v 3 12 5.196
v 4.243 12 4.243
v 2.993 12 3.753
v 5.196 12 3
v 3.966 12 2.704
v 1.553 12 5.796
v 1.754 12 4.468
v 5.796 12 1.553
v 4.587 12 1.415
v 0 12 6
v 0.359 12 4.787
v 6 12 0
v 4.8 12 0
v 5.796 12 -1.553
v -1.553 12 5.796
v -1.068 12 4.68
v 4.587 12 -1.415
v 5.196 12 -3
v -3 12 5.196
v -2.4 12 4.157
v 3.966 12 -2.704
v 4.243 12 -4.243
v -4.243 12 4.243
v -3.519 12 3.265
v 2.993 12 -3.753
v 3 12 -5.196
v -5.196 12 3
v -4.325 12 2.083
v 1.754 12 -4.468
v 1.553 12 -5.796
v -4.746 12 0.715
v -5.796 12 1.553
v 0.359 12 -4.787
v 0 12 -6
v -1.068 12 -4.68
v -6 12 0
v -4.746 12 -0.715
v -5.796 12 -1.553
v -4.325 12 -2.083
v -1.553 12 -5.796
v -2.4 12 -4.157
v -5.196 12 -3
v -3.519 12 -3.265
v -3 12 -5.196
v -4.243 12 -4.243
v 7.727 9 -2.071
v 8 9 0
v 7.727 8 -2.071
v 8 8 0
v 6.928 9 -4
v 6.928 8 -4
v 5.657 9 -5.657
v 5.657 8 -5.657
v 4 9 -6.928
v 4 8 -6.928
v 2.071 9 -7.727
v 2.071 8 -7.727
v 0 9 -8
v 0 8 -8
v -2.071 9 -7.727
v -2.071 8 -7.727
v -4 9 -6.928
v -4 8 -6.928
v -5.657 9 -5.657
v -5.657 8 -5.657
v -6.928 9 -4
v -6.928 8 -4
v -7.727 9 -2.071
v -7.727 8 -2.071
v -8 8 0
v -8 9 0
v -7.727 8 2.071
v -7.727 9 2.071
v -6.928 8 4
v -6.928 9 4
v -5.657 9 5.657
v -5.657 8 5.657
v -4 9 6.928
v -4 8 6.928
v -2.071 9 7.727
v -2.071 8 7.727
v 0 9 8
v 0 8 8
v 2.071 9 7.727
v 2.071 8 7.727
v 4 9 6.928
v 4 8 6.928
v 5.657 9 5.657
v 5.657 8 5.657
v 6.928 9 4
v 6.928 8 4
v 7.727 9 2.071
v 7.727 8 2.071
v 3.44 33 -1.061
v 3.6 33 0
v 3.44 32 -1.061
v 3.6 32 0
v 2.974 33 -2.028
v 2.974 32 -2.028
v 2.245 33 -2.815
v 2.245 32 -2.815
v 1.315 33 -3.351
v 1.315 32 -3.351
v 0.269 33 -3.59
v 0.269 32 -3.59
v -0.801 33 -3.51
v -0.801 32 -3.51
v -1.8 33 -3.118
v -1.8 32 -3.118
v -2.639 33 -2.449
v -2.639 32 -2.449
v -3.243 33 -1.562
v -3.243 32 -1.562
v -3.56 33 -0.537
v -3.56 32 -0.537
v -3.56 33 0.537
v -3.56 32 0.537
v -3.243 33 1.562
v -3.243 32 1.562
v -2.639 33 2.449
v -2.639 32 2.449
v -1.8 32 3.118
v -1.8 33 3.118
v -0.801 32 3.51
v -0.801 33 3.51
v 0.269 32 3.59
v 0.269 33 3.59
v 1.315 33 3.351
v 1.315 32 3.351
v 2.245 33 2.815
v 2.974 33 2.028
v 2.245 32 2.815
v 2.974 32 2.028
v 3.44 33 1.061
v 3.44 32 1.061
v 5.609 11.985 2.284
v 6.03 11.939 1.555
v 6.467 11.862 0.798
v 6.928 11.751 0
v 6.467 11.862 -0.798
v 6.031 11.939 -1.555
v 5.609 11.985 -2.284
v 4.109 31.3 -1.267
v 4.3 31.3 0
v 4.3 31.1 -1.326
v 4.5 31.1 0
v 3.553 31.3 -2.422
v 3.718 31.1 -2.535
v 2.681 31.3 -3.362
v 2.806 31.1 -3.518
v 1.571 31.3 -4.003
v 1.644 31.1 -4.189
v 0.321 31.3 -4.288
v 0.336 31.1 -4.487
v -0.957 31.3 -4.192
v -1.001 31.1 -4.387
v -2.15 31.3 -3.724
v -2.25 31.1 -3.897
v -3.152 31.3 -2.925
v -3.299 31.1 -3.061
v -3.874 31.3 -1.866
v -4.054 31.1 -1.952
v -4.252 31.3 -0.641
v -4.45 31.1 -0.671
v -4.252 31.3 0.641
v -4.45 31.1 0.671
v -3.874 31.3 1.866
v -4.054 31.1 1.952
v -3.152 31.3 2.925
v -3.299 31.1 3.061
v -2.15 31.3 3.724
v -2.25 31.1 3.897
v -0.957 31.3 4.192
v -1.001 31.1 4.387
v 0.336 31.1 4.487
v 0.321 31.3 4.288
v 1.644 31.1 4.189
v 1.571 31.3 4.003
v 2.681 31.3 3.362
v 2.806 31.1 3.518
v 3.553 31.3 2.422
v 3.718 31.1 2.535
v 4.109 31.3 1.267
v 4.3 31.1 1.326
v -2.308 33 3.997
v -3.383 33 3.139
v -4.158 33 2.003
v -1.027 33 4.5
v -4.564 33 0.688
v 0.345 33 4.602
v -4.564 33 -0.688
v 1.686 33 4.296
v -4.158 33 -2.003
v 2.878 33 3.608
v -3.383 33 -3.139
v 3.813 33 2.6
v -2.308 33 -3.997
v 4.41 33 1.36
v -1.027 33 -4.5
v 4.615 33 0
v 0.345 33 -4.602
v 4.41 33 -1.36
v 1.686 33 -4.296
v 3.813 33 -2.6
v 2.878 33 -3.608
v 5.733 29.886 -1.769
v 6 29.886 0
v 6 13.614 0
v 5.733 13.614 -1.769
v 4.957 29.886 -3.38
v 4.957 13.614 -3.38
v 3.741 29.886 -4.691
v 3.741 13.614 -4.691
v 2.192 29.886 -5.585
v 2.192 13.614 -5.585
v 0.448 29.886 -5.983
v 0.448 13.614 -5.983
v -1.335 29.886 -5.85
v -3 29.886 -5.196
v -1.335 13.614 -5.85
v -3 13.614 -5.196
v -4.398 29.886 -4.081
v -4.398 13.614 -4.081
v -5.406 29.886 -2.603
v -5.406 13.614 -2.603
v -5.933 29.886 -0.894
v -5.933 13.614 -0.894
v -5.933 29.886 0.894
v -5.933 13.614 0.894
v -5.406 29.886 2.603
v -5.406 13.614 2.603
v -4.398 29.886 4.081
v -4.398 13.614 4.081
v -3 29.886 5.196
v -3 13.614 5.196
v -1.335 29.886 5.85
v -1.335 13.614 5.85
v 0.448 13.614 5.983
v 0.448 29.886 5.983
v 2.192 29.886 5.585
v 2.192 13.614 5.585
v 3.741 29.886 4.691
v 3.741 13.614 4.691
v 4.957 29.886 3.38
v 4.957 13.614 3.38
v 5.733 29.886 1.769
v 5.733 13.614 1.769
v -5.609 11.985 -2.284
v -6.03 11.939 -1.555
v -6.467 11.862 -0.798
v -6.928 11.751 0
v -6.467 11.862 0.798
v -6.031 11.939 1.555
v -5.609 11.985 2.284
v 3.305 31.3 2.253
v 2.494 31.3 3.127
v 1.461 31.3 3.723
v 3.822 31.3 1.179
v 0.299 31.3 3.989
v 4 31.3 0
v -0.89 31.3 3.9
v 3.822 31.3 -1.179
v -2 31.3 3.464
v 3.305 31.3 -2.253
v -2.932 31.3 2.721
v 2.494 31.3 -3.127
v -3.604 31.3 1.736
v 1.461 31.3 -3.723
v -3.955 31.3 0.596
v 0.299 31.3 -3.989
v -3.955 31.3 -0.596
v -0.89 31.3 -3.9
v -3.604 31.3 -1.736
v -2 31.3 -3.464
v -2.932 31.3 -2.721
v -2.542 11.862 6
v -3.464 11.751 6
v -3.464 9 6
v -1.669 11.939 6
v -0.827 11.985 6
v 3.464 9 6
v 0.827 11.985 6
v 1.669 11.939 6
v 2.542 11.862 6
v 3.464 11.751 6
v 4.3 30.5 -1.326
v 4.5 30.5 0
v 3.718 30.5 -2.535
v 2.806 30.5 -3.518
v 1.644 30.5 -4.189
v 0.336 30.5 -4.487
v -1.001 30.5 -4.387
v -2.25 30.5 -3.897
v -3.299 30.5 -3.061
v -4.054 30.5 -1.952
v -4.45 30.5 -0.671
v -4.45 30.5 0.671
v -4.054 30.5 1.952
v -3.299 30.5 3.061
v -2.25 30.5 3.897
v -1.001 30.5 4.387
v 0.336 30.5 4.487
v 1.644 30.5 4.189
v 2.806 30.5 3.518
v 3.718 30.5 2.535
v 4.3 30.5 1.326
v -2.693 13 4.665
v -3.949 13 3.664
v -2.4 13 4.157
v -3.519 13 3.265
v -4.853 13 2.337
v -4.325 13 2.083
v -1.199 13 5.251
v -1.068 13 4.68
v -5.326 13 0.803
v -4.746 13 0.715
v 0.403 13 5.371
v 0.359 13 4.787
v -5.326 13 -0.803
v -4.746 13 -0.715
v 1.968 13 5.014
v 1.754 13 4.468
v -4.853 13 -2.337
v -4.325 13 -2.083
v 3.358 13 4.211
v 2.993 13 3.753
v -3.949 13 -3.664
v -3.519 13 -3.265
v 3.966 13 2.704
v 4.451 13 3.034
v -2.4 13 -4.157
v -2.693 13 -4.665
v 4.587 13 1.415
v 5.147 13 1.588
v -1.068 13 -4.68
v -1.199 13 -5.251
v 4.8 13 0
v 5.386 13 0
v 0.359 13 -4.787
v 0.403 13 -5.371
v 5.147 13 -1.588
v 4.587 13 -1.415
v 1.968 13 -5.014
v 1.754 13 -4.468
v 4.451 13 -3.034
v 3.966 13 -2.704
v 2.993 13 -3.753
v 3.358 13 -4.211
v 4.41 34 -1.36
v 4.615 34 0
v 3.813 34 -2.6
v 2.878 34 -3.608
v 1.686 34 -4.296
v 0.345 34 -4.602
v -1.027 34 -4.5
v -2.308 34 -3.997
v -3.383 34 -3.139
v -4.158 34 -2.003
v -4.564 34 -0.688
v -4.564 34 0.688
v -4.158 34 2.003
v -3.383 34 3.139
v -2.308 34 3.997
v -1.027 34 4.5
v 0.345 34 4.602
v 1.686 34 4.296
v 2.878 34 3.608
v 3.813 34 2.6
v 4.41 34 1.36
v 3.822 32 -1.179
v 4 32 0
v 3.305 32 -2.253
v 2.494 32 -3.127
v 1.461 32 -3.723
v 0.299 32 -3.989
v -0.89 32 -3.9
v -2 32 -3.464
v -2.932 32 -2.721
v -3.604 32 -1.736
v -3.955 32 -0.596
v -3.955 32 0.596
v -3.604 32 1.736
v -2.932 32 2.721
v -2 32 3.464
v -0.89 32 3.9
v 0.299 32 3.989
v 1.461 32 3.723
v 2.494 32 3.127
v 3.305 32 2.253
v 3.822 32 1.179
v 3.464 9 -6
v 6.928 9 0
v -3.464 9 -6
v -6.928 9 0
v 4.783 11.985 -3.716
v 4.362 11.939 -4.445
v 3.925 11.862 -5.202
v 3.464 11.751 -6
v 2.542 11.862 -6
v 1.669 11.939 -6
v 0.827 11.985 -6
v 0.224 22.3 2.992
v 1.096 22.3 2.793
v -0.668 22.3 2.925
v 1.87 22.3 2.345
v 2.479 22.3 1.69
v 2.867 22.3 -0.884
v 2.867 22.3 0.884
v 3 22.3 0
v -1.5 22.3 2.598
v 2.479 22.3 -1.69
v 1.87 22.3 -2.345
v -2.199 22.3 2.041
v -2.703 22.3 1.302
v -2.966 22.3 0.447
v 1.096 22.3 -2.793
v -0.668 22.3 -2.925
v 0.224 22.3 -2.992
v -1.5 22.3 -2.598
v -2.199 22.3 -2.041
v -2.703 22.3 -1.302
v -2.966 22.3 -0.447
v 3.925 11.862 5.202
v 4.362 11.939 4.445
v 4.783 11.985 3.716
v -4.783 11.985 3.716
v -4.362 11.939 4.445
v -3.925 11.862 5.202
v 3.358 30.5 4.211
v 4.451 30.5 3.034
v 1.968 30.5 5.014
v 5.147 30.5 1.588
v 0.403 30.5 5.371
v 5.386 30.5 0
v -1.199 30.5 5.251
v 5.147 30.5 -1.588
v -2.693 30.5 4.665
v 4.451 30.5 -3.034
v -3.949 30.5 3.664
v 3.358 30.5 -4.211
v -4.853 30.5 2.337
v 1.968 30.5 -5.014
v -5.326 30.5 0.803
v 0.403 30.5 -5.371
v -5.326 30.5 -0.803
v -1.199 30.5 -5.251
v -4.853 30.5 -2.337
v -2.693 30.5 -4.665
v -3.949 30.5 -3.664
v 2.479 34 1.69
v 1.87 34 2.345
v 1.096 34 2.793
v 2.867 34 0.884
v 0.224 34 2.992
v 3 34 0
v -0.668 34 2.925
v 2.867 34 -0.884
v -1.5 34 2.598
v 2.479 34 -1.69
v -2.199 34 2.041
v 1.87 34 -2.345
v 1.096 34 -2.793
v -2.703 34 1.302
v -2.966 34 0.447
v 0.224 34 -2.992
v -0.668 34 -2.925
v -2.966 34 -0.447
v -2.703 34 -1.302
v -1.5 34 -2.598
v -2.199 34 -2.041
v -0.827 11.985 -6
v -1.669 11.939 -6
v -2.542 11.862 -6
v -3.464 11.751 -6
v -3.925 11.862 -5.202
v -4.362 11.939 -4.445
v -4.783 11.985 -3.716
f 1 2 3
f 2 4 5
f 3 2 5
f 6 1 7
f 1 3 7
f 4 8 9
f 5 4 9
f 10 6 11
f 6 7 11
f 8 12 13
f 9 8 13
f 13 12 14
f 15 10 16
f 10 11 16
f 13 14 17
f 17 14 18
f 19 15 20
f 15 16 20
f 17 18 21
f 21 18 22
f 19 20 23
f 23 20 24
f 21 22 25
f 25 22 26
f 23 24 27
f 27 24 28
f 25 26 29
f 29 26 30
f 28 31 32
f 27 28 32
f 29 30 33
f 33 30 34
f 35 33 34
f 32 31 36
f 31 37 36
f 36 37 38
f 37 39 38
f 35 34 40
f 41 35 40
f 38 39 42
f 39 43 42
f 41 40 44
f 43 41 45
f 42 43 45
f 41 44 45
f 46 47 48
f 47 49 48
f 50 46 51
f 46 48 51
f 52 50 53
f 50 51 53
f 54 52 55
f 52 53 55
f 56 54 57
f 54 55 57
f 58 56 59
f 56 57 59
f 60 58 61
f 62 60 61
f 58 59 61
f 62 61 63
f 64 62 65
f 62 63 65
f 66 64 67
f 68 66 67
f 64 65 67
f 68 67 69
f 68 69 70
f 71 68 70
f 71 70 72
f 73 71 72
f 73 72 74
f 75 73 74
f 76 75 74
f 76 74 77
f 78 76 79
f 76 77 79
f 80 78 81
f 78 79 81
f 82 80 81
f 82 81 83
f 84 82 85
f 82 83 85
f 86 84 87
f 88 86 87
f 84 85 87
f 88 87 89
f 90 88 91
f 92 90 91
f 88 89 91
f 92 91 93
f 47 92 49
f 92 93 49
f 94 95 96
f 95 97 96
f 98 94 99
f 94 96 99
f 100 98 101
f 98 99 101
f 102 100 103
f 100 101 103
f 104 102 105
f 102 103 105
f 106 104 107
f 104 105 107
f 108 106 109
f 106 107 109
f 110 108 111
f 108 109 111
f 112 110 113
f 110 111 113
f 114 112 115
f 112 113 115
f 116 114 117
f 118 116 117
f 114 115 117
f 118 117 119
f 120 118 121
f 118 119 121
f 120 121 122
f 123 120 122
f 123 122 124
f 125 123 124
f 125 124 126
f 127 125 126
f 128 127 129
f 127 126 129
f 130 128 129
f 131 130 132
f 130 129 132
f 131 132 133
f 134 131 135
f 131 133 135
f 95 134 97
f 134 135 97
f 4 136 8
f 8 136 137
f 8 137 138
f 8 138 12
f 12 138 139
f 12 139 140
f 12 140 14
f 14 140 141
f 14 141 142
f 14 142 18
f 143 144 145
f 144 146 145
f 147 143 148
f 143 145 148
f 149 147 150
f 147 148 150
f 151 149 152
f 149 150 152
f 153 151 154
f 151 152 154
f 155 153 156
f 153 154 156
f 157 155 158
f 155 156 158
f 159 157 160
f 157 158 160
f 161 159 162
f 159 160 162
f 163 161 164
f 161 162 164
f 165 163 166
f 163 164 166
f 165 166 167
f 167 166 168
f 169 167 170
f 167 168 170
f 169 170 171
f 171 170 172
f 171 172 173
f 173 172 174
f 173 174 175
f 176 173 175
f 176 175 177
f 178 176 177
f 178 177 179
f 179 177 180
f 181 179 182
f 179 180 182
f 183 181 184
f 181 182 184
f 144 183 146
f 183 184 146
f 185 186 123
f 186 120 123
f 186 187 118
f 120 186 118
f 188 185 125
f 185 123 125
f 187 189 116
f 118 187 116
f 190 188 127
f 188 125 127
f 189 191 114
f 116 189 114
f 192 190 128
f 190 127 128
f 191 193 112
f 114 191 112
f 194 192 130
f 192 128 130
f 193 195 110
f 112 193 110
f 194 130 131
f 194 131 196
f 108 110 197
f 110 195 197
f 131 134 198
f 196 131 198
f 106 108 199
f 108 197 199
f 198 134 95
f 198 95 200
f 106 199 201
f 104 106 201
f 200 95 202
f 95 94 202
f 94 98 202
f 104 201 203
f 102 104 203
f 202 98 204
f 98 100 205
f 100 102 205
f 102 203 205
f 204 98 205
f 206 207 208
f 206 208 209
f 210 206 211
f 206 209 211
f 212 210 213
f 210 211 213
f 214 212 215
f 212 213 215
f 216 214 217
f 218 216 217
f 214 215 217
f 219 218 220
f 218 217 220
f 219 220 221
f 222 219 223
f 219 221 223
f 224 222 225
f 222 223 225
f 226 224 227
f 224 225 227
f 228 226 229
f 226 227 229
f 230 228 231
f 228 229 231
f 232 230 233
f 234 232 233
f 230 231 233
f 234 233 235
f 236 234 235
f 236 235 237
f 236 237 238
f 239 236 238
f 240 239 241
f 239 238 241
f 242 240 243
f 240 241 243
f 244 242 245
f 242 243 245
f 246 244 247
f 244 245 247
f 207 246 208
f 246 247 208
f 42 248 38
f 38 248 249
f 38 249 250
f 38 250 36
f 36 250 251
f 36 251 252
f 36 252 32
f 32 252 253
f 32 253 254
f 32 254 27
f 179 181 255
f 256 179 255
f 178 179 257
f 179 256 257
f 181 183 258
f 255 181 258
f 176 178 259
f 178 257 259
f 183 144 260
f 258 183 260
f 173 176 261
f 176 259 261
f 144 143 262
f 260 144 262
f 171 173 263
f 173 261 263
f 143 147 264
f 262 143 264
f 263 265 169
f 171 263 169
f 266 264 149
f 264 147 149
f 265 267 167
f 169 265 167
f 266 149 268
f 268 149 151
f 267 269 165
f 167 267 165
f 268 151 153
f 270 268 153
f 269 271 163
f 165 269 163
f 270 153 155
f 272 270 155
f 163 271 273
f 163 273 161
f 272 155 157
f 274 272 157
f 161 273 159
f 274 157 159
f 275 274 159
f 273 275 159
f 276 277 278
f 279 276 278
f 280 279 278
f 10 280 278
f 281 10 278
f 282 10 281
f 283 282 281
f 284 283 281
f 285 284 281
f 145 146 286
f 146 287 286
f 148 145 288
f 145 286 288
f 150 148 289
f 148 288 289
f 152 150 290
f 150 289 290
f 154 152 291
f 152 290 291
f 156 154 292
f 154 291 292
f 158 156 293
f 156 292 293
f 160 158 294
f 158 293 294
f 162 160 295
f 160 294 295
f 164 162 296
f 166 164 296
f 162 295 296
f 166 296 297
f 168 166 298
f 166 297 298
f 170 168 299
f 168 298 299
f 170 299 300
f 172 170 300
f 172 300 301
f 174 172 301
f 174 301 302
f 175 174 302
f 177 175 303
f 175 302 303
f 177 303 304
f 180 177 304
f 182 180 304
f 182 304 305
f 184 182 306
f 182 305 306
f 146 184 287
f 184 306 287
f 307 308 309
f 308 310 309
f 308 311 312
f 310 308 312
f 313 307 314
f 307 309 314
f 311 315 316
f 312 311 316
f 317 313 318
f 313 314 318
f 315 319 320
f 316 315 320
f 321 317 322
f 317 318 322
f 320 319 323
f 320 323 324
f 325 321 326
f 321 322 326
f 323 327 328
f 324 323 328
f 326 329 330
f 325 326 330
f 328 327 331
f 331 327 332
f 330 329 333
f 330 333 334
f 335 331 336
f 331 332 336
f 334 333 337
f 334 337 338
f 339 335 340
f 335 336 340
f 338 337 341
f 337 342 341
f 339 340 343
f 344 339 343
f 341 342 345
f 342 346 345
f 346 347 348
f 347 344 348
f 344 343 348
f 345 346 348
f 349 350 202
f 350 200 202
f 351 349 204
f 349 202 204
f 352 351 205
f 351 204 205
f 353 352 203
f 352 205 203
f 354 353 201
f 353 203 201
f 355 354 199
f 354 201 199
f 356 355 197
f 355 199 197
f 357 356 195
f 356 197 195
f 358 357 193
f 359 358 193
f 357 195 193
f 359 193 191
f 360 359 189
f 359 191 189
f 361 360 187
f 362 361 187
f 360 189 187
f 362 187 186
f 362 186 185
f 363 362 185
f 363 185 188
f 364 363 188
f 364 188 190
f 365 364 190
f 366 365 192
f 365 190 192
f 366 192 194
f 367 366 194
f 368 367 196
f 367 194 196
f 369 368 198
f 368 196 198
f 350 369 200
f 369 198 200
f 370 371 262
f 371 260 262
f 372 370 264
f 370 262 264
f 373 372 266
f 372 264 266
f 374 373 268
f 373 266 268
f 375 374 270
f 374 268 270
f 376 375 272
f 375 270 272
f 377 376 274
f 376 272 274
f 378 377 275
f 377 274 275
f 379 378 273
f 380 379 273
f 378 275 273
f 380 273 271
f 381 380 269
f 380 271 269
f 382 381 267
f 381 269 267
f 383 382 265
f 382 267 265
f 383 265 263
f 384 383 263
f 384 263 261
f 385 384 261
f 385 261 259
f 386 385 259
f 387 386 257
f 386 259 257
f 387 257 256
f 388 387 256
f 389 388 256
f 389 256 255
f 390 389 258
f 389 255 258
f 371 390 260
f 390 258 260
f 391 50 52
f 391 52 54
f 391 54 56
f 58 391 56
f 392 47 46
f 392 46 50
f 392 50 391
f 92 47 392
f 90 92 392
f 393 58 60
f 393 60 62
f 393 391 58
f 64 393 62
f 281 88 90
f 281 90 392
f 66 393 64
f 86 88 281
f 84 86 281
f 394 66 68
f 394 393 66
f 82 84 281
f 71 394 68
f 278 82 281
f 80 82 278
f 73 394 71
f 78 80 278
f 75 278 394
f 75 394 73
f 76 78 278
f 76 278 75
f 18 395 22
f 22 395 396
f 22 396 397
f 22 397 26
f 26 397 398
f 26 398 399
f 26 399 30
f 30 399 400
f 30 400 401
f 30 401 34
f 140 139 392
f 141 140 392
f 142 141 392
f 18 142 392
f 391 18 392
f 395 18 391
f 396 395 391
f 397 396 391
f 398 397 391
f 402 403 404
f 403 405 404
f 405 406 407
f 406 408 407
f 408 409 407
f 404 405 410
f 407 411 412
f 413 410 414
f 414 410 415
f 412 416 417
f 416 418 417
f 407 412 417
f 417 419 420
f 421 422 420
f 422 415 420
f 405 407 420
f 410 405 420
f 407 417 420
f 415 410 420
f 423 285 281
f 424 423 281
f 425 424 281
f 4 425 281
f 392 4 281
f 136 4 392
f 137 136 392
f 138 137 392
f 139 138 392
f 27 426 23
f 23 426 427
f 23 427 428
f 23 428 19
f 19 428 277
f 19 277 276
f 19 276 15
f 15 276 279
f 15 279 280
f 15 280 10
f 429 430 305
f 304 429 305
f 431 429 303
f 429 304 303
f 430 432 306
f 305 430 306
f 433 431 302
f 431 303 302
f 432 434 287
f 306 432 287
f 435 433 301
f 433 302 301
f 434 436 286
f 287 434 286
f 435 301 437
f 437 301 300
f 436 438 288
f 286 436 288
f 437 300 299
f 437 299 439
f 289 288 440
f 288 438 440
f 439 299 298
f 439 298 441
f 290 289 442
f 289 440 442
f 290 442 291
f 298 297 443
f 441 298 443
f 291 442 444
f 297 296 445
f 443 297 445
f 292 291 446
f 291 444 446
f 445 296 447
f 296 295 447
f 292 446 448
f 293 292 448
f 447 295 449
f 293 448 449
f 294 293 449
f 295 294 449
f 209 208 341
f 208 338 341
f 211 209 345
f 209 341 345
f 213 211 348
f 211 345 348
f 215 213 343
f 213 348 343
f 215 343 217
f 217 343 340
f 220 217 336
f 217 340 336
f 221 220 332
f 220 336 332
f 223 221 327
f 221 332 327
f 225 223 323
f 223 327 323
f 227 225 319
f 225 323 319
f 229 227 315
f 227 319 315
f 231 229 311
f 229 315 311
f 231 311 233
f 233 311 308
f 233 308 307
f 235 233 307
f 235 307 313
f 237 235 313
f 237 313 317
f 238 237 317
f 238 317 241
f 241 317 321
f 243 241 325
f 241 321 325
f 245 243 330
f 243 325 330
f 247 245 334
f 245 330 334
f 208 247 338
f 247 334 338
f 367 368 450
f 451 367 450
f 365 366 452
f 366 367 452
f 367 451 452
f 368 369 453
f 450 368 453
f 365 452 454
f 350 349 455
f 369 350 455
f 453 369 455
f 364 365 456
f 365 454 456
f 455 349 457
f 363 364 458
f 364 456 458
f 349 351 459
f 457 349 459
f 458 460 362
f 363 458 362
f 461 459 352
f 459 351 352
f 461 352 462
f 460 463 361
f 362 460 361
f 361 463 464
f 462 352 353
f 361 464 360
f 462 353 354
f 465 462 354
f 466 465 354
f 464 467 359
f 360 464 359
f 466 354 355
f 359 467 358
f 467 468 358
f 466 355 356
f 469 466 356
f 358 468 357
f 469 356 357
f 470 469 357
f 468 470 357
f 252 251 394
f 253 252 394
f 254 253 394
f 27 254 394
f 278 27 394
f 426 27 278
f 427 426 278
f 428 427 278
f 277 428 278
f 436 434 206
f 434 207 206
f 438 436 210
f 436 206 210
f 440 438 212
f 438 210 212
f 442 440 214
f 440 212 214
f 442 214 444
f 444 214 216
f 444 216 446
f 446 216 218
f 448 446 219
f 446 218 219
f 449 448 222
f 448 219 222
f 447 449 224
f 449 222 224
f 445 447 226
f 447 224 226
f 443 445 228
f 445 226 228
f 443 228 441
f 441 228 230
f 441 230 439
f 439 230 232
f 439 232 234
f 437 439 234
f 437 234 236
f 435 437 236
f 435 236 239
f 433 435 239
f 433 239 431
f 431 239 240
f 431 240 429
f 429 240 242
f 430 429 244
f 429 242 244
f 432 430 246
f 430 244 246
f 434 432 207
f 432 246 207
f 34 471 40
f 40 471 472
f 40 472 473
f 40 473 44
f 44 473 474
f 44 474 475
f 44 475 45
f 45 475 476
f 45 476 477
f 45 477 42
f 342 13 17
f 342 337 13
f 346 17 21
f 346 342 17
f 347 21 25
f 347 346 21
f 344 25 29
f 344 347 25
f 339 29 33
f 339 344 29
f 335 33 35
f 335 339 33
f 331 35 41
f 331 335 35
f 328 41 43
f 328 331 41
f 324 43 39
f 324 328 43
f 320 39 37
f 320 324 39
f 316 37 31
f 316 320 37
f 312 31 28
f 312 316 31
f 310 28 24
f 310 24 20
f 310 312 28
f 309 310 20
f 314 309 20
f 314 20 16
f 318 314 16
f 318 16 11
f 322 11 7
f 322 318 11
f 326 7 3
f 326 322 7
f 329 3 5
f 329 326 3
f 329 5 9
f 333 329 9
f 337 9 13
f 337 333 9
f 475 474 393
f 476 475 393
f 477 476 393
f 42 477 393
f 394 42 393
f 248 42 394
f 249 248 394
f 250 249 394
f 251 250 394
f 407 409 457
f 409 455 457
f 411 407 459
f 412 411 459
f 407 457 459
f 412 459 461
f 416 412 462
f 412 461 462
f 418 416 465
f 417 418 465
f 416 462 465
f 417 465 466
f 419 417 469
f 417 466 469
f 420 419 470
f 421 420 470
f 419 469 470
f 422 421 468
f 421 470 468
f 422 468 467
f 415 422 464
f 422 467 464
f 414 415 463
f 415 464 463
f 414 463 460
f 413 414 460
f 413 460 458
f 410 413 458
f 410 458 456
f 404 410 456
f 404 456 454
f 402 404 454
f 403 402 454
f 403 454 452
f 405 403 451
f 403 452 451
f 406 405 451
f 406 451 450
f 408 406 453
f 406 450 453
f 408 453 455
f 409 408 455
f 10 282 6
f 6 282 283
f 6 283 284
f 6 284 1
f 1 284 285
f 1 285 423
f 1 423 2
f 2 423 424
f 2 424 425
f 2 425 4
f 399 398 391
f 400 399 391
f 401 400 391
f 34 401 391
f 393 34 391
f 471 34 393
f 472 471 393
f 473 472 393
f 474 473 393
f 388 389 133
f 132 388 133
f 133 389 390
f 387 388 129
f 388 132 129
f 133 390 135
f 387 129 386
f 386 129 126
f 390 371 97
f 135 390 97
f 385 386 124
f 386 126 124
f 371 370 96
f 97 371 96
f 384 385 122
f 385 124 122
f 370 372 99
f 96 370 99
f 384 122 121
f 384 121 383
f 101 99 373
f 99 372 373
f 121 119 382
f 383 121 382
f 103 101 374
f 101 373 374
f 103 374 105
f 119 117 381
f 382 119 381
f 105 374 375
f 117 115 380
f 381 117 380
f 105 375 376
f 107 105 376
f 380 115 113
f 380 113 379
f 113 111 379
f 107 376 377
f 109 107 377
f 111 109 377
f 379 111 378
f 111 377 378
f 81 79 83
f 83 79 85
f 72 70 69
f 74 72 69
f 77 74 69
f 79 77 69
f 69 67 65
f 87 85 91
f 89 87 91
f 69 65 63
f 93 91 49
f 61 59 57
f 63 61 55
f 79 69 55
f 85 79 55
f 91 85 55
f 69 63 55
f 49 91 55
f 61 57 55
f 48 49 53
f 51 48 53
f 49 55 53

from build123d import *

# Parameters (mm, degrees)
SKETCH5_W          = 34
SKETCH5_H          = 34
CUT_EXTRUDE1_DEPTH = 3
SKETCH6_W          = 3
SKETCH6_H          = 11.7
SKETCH7_W          = 4.8
SKETCH7_H          = 1


with BuildPart() as part:
    # Sketch1 → Revolve1 (revolve)
    with BuildSketch(Plane.XY):
        Polygon((0, 34), (4.615384615, 34), (4.615384615, 33), (3.6, 33), (3.6, 32), (4, 32), (4, 12), (4.8, 12), (4.8, 9.5), (3.157894737, 9.5), (3.157894737, 8), (0, 8), align=None)
    revolve(axis=Axis((0, 8, 0), (0, 1, 0)))

    # Sketch2 → Revolve2 (revolve)
    with BuildSketch(Plane.XY):
        Polygon((0, 30.5), (5.3865, 30.5), (6, 29.8865), (6, 13.6135), (5.3865, 13), (0, 13), align=None)
    revolve(axis=Axis((0, 13, 0), (0, 1, 0)))

    # Sketch3 → Revolve3 (revolve)
    with BuildSketch(Plane.XY):
        Polygon((0, 32), (3.5, 32), (4, 31.3), (4.3, 31.3), (4.5, 31.1), (4.5, 30.5), (0, 30.5), align=None)
    revolve(axis=Axis((0, 30.5, 0), (0, 1, 0)))

    # Sketch4 → Revolve4 (revolve)
    with BuildSketch(Plane.XY):
        Polygon((0, 12), (6, 12), (7.2, 11.678460969), (7.2, 9), (8, 9), (8, 8), (0, 8), align=None)
    revolve(axis=Axis((0, 8, 0), (0, 1, 0)))

    # Sketch5 → Cut-Extrude1 (cut)
    with BuildSketch(Plane(origin=(0, 12, 0), x_dir=(-1, 0, 0), z_dir=(0, 1, 0))):
        Rectangle(SKETCH5_W, SKETCH5_H)
        Polygon((6.92820323, 0), (3.464101615, 6), (-3.464101615, 6), (-6.92820323, 0), (-3.464101615, -6), (3.464101615, -6), align=None, mode=Mode.SUBTRACT)
    extrude(amount=-CUT_EXTRUDE1_DEPTH, mode=Mode.SUBTRACT)

    # Sketch6 → Cut-Revolve1 (revolve, cut)
    with BuildSketch(Plane.XY):
        with Locations((1.5, 28.15)):
            Rectangle(SKETCH6_W, SKETCH6_H)
    revolve(axis=Axis((0, 22.3, 0), (0, 1, 0)), mode=Mode.SUBTRACT)

    # Sketch7 → Revolve5 (revolve)
    with BuildSketch(Plane.XY):
        with Locations((2.4, 12.5)):
            Rectangle(SKETCH7_W, SKETCH7_H)
    revolve(axis=Axis((0, 12, 0), (0, 1, 0)))


solid = part.part
